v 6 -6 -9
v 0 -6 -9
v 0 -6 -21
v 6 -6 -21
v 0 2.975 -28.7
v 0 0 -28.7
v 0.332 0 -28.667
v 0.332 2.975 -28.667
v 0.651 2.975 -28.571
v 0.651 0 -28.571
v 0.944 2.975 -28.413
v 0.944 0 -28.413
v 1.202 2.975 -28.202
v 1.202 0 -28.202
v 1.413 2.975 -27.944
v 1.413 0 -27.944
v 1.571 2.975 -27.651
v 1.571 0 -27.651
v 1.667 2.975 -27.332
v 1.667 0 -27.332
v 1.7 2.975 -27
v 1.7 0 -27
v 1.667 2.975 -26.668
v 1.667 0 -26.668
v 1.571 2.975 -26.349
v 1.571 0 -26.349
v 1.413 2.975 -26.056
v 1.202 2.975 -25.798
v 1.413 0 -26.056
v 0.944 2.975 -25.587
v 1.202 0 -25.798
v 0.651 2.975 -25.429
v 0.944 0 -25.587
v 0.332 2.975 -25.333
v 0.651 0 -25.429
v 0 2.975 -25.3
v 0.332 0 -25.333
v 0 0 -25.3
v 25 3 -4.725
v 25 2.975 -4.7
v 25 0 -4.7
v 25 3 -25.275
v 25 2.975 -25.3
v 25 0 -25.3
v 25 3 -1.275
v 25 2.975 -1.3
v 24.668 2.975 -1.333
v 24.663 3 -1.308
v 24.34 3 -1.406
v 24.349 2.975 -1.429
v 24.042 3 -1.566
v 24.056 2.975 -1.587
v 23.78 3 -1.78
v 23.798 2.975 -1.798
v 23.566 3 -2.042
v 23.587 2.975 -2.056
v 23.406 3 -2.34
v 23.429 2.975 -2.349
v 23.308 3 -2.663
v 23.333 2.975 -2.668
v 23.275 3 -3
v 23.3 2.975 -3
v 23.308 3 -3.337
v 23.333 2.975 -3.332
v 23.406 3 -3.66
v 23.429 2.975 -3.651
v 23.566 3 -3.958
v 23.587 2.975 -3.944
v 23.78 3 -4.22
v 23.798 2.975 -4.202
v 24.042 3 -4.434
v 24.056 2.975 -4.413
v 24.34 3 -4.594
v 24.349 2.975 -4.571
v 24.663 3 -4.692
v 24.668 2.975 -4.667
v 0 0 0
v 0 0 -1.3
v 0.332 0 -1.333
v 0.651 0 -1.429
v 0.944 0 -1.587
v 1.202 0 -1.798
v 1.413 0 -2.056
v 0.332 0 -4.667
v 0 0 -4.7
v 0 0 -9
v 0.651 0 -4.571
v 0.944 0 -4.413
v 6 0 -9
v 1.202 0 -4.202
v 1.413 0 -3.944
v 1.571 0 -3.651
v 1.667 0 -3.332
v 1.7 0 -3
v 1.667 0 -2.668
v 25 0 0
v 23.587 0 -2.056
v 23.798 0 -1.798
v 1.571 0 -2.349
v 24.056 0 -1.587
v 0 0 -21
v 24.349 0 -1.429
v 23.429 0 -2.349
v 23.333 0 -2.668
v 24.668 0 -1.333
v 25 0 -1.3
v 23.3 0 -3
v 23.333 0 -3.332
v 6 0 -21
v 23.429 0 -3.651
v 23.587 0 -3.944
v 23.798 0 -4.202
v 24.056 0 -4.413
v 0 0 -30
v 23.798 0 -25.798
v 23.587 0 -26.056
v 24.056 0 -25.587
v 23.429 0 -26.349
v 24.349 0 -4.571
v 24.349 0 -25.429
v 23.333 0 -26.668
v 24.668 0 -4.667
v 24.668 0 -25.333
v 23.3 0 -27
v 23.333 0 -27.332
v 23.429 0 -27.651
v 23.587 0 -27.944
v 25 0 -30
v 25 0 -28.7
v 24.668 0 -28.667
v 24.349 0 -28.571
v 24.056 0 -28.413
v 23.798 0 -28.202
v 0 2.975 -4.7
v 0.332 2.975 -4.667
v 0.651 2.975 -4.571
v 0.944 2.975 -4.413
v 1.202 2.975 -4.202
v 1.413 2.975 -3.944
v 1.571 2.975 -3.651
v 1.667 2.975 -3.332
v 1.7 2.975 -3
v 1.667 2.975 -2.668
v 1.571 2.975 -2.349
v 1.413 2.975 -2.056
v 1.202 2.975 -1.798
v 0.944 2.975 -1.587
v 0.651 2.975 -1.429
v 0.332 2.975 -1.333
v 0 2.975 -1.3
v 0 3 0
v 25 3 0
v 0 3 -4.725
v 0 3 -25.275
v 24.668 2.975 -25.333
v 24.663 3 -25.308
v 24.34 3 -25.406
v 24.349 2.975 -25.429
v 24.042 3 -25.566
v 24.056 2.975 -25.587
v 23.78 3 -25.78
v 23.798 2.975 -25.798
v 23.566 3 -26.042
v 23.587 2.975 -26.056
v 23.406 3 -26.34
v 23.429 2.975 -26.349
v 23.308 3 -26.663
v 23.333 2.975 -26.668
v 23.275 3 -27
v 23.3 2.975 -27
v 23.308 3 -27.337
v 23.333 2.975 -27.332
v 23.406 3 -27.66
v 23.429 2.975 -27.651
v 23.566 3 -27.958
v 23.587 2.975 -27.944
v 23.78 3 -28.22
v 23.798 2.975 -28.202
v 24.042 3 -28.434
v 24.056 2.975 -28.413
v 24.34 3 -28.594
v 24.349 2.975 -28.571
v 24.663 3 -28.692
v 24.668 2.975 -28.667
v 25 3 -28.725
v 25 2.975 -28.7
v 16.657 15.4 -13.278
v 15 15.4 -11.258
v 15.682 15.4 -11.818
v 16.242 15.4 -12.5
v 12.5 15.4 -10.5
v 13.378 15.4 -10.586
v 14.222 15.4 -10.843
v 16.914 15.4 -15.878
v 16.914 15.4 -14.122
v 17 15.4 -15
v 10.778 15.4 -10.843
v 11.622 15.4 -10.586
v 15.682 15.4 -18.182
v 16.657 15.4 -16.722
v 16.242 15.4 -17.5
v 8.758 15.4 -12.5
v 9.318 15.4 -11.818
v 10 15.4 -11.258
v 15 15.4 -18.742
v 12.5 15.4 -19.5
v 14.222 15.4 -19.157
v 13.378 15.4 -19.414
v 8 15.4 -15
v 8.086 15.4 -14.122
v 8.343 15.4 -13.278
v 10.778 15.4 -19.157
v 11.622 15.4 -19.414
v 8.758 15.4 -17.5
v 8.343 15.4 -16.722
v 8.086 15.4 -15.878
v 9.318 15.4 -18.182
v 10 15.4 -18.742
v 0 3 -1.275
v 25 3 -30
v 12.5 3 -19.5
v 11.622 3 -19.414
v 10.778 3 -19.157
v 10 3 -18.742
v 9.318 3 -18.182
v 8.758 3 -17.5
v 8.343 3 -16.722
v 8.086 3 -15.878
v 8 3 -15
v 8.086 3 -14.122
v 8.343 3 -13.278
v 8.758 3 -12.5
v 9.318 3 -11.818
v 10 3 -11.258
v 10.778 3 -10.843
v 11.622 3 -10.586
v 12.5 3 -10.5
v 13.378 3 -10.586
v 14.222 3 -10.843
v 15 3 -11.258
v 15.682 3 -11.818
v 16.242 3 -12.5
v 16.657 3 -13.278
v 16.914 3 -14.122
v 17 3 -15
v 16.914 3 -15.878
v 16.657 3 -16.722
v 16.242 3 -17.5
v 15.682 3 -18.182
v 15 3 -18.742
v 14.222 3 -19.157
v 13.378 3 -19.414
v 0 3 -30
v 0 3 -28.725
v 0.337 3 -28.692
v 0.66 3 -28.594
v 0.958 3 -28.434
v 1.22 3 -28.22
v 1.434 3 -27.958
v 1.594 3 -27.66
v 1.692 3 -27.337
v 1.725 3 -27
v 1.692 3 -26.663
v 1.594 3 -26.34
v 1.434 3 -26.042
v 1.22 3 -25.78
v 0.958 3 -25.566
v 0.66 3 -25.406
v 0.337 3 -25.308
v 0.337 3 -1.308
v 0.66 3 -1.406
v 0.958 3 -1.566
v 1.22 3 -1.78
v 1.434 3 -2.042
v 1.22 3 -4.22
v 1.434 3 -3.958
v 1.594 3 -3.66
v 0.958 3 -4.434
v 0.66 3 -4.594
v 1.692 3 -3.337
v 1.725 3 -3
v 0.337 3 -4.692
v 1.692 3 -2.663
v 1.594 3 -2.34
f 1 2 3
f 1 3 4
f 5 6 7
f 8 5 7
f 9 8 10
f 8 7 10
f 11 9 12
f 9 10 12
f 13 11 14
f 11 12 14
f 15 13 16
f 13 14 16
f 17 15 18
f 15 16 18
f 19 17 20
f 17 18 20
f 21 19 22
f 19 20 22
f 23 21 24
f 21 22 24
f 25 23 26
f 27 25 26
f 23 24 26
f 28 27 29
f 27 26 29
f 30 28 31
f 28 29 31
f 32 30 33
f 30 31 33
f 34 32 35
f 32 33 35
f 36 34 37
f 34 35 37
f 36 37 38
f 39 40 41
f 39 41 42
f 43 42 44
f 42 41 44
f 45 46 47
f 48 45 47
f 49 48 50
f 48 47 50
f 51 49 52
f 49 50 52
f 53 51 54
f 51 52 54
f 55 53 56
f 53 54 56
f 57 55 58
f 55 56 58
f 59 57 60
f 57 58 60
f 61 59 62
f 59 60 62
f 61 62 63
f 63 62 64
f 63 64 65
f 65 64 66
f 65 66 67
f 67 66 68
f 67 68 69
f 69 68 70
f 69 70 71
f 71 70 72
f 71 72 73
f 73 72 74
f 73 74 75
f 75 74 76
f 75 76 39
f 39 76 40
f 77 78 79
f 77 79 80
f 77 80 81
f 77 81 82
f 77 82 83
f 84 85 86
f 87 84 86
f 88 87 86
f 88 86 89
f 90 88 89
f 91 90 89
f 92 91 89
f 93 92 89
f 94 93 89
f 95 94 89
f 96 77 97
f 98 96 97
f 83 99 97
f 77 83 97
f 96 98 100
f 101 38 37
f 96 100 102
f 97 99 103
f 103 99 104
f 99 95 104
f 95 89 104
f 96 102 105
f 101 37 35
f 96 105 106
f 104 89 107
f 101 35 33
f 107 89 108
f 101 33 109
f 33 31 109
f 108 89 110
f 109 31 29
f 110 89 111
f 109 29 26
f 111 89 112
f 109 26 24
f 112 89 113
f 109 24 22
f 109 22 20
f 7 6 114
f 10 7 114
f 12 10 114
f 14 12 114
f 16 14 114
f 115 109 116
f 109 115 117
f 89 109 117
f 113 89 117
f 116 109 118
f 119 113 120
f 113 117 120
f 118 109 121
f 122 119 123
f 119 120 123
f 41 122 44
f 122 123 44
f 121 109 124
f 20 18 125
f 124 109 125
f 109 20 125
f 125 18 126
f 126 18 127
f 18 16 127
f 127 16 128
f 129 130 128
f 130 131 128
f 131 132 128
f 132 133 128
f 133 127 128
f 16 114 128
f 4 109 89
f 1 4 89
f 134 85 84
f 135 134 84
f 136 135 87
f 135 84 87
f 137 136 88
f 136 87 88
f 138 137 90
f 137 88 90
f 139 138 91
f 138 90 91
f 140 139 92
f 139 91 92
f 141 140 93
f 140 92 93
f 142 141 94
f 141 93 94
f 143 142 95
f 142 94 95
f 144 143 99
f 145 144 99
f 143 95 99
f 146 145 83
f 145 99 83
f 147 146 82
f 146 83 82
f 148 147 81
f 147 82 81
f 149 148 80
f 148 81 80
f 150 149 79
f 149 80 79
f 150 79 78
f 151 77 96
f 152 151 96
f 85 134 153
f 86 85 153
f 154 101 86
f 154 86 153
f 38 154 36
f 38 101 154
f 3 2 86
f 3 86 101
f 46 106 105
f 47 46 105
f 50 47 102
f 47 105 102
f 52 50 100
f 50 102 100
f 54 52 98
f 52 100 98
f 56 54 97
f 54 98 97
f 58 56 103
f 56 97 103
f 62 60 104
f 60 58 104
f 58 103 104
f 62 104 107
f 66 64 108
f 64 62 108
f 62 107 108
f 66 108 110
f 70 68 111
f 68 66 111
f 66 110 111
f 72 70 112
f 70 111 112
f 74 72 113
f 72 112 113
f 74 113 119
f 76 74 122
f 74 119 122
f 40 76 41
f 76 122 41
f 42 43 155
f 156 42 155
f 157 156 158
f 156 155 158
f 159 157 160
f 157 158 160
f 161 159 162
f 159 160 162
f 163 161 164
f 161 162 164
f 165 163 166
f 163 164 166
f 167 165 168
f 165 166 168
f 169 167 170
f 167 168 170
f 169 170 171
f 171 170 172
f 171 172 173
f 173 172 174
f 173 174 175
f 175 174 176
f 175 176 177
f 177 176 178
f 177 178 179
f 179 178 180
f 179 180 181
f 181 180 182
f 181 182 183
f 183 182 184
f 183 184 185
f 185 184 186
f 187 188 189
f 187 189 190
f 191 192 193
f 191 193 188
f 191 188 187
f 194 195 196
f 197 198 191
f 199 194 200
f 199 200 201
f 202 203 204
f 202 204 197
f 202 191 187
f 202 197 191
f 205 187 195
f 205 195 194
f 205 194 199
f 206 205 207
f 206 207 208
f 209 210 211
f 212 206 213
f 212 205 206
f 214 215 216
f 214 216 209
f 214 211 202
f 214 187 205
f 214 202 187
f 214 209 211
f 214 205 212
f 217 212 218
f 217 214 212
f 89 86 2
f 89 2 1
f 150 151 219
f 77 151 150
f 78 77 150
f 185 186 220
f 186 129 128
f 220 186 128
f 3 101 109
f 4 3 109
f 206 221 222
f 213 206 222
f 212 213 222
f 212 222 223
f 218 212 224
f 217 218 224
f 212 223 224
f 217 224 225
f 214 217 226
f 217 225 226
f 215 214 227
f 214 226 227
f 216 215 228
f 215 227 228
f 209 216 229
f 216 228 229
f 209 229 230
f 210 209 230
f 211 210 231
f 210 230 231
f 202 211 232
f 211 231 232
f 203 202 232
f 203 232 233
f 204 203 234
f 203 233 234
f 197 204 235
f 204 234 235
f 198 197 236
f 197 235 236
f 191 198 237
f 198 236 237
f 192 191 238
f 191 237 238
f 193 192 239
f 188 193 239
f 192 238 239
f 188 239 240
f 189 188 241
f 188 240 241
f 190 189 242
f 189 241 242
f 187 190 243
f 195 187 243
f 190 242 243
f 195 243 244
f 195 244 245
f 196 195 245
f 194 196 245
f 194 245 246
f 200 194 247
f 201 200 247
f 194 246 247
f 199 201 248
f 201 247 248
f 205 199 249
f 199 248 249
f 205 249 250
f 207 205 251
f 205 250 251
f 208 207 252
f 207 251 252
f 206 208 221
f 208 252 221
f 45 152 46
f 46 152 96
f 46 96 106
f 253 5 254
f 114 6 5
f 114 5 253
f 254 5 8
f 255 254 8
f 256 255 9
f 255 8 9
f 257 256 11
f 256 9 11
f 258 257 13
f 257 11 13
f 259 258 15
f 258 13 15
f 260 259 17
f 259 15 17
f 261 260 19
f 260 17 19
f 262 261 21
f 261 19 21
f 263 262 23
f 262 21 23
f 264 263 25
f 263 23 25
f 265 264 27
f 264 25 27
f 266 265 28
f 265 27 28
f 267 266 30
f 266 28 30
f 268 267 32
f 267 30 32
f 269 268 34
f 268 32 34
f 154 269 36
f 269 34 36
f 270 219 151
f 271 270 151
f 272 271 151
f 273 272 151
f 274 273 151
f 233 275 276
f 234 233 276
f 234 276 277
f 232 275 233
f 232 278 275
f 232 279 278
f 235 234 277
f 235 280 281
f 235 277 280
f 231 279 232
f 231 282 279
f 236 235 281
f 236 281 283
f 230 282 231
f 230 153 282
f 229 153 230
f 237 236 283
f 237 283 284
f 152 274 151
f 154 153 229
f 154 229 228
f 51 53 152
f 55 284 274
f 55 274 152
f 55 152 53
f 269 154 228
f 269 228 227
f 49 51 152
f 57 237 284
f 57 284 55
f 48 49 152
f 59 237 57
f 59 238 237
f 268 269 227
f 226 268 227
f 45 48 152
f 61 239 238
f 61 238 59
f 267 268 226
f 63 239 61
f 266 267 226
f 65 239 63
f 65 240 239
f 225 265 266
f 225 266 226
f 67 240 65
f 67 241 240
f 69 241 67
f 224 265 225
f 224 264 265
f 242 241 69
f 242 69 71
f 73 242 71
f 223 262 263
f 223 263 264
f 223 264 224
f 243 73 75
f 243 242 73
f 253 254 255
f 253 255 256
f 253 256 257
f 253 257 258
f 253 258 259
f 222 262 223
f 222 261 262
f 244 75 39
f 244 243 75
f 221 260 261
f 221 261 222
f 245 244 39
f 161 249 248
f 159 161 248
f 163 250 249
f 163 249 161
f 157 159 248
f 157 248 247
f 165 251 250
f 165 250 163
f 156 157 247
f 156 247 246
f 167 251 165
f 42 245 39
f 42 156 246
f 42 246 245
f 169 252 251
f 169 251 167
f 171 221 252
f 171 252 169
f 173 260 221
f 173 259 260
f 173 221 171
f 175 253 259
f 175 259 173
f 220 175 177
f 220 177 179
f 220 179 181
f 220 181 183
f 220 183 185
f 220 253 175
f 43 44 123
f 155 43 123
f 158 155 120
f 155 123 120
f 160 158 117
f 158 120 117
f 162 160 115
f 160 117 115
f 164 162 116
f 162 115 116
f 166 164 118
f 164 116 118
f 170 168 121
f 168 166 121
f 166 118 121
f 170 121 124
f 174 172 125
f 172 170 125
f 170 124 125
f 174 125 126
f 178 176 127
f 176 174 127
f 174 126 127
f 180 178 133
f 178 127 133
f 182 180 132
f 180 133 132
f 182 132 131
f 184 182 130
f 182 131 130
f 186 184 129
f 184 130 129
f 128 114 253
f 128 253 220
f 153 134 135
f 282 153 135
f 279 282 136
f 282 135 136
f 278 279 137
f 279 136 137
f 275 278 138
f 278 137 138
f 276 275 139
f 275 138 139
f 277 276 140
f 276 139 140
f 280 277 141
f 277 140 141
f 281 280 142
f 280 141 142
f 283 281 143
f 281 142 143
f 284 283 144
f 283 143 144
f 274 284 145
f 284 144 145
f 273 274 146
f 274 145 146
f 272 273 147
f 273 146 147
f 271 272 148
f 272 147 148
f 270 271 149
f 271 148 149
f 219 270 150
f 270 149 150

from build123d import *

# Parameters (mm, degrees)
SKETCH1_W                      = 25
SKETCH1_H                      = 30
BOSS_EXTRUDE1_DEPTH            = 3
M3_CLEARANCE_HOLE1_D           = 3.4
M3_CLEARANCE_HOLE1_CSINK_D     = 3.45
M3_CLEARANCE_HOLE1_CSINK_ANGLE = 90
SKETCH4_R                      = 4.5
BOSS_EXTRUDE2_DEPTH            = 12.4
SKETCH5_W                      = 6
SKETCH5_H                      = 12
BOSS_EXTRUDE3_DEPTH            = 6


with BuildPart() as part:
    # Sketch1 → Boss-Extrude1 (new body)
    with BuildSketch(Plane(origin=(0, 0, 0), x_dir=(1, 0, 0), z_dir=(0, 1, 0))):
        with Locations((12.5, 15)):
            Rectangle(SKETCH1_W, SKETCH1_H)
    extrude(amount=BOSS_EXTRUDE1_DEPTH)

    # M3 Clearance Hole1 (through all)
    with Locations(Plane(origin=(0, 3, 0), x_dir=(1, 0, 0), z_dir=(0, 1, 0))):
        with Locations((0, 3), (0, 27), (25, 3), (25, 27)):
            CounterSinkHole(M3_CLEARANCE_HOLE1_D / 2, M3_CLEARANCE_HOLE1_CSINK_D / 2, counter_sink_angle=M3_CLEARANCE_HOLE1_CSINK_ANGLE)

    # Sketch4 → Boss-Extrude2 (add)
    with BuildSketch(Plane(origin=(0, 3, 0), x_dir=(1, 0, 0), z_dir=(0, 1, 0))):
        with Locations(Location((12.5, 15, 0), (0, 0, 90))):
            Circle(SKETCH4_R)
    extrude(amount=BOSS_EXTRUDE2_DEPTH)

    # Sketch5 → Boss-Extrude3 (add)
    with BuildSketch(Plane.XZ):
        with Locations((3, -15)):
            Rectangle(SKETCH5_W, SKETCH5_H)
    extrude(amount=BOSS_EXTRUDE3_DEPTH)


solid = part.part
